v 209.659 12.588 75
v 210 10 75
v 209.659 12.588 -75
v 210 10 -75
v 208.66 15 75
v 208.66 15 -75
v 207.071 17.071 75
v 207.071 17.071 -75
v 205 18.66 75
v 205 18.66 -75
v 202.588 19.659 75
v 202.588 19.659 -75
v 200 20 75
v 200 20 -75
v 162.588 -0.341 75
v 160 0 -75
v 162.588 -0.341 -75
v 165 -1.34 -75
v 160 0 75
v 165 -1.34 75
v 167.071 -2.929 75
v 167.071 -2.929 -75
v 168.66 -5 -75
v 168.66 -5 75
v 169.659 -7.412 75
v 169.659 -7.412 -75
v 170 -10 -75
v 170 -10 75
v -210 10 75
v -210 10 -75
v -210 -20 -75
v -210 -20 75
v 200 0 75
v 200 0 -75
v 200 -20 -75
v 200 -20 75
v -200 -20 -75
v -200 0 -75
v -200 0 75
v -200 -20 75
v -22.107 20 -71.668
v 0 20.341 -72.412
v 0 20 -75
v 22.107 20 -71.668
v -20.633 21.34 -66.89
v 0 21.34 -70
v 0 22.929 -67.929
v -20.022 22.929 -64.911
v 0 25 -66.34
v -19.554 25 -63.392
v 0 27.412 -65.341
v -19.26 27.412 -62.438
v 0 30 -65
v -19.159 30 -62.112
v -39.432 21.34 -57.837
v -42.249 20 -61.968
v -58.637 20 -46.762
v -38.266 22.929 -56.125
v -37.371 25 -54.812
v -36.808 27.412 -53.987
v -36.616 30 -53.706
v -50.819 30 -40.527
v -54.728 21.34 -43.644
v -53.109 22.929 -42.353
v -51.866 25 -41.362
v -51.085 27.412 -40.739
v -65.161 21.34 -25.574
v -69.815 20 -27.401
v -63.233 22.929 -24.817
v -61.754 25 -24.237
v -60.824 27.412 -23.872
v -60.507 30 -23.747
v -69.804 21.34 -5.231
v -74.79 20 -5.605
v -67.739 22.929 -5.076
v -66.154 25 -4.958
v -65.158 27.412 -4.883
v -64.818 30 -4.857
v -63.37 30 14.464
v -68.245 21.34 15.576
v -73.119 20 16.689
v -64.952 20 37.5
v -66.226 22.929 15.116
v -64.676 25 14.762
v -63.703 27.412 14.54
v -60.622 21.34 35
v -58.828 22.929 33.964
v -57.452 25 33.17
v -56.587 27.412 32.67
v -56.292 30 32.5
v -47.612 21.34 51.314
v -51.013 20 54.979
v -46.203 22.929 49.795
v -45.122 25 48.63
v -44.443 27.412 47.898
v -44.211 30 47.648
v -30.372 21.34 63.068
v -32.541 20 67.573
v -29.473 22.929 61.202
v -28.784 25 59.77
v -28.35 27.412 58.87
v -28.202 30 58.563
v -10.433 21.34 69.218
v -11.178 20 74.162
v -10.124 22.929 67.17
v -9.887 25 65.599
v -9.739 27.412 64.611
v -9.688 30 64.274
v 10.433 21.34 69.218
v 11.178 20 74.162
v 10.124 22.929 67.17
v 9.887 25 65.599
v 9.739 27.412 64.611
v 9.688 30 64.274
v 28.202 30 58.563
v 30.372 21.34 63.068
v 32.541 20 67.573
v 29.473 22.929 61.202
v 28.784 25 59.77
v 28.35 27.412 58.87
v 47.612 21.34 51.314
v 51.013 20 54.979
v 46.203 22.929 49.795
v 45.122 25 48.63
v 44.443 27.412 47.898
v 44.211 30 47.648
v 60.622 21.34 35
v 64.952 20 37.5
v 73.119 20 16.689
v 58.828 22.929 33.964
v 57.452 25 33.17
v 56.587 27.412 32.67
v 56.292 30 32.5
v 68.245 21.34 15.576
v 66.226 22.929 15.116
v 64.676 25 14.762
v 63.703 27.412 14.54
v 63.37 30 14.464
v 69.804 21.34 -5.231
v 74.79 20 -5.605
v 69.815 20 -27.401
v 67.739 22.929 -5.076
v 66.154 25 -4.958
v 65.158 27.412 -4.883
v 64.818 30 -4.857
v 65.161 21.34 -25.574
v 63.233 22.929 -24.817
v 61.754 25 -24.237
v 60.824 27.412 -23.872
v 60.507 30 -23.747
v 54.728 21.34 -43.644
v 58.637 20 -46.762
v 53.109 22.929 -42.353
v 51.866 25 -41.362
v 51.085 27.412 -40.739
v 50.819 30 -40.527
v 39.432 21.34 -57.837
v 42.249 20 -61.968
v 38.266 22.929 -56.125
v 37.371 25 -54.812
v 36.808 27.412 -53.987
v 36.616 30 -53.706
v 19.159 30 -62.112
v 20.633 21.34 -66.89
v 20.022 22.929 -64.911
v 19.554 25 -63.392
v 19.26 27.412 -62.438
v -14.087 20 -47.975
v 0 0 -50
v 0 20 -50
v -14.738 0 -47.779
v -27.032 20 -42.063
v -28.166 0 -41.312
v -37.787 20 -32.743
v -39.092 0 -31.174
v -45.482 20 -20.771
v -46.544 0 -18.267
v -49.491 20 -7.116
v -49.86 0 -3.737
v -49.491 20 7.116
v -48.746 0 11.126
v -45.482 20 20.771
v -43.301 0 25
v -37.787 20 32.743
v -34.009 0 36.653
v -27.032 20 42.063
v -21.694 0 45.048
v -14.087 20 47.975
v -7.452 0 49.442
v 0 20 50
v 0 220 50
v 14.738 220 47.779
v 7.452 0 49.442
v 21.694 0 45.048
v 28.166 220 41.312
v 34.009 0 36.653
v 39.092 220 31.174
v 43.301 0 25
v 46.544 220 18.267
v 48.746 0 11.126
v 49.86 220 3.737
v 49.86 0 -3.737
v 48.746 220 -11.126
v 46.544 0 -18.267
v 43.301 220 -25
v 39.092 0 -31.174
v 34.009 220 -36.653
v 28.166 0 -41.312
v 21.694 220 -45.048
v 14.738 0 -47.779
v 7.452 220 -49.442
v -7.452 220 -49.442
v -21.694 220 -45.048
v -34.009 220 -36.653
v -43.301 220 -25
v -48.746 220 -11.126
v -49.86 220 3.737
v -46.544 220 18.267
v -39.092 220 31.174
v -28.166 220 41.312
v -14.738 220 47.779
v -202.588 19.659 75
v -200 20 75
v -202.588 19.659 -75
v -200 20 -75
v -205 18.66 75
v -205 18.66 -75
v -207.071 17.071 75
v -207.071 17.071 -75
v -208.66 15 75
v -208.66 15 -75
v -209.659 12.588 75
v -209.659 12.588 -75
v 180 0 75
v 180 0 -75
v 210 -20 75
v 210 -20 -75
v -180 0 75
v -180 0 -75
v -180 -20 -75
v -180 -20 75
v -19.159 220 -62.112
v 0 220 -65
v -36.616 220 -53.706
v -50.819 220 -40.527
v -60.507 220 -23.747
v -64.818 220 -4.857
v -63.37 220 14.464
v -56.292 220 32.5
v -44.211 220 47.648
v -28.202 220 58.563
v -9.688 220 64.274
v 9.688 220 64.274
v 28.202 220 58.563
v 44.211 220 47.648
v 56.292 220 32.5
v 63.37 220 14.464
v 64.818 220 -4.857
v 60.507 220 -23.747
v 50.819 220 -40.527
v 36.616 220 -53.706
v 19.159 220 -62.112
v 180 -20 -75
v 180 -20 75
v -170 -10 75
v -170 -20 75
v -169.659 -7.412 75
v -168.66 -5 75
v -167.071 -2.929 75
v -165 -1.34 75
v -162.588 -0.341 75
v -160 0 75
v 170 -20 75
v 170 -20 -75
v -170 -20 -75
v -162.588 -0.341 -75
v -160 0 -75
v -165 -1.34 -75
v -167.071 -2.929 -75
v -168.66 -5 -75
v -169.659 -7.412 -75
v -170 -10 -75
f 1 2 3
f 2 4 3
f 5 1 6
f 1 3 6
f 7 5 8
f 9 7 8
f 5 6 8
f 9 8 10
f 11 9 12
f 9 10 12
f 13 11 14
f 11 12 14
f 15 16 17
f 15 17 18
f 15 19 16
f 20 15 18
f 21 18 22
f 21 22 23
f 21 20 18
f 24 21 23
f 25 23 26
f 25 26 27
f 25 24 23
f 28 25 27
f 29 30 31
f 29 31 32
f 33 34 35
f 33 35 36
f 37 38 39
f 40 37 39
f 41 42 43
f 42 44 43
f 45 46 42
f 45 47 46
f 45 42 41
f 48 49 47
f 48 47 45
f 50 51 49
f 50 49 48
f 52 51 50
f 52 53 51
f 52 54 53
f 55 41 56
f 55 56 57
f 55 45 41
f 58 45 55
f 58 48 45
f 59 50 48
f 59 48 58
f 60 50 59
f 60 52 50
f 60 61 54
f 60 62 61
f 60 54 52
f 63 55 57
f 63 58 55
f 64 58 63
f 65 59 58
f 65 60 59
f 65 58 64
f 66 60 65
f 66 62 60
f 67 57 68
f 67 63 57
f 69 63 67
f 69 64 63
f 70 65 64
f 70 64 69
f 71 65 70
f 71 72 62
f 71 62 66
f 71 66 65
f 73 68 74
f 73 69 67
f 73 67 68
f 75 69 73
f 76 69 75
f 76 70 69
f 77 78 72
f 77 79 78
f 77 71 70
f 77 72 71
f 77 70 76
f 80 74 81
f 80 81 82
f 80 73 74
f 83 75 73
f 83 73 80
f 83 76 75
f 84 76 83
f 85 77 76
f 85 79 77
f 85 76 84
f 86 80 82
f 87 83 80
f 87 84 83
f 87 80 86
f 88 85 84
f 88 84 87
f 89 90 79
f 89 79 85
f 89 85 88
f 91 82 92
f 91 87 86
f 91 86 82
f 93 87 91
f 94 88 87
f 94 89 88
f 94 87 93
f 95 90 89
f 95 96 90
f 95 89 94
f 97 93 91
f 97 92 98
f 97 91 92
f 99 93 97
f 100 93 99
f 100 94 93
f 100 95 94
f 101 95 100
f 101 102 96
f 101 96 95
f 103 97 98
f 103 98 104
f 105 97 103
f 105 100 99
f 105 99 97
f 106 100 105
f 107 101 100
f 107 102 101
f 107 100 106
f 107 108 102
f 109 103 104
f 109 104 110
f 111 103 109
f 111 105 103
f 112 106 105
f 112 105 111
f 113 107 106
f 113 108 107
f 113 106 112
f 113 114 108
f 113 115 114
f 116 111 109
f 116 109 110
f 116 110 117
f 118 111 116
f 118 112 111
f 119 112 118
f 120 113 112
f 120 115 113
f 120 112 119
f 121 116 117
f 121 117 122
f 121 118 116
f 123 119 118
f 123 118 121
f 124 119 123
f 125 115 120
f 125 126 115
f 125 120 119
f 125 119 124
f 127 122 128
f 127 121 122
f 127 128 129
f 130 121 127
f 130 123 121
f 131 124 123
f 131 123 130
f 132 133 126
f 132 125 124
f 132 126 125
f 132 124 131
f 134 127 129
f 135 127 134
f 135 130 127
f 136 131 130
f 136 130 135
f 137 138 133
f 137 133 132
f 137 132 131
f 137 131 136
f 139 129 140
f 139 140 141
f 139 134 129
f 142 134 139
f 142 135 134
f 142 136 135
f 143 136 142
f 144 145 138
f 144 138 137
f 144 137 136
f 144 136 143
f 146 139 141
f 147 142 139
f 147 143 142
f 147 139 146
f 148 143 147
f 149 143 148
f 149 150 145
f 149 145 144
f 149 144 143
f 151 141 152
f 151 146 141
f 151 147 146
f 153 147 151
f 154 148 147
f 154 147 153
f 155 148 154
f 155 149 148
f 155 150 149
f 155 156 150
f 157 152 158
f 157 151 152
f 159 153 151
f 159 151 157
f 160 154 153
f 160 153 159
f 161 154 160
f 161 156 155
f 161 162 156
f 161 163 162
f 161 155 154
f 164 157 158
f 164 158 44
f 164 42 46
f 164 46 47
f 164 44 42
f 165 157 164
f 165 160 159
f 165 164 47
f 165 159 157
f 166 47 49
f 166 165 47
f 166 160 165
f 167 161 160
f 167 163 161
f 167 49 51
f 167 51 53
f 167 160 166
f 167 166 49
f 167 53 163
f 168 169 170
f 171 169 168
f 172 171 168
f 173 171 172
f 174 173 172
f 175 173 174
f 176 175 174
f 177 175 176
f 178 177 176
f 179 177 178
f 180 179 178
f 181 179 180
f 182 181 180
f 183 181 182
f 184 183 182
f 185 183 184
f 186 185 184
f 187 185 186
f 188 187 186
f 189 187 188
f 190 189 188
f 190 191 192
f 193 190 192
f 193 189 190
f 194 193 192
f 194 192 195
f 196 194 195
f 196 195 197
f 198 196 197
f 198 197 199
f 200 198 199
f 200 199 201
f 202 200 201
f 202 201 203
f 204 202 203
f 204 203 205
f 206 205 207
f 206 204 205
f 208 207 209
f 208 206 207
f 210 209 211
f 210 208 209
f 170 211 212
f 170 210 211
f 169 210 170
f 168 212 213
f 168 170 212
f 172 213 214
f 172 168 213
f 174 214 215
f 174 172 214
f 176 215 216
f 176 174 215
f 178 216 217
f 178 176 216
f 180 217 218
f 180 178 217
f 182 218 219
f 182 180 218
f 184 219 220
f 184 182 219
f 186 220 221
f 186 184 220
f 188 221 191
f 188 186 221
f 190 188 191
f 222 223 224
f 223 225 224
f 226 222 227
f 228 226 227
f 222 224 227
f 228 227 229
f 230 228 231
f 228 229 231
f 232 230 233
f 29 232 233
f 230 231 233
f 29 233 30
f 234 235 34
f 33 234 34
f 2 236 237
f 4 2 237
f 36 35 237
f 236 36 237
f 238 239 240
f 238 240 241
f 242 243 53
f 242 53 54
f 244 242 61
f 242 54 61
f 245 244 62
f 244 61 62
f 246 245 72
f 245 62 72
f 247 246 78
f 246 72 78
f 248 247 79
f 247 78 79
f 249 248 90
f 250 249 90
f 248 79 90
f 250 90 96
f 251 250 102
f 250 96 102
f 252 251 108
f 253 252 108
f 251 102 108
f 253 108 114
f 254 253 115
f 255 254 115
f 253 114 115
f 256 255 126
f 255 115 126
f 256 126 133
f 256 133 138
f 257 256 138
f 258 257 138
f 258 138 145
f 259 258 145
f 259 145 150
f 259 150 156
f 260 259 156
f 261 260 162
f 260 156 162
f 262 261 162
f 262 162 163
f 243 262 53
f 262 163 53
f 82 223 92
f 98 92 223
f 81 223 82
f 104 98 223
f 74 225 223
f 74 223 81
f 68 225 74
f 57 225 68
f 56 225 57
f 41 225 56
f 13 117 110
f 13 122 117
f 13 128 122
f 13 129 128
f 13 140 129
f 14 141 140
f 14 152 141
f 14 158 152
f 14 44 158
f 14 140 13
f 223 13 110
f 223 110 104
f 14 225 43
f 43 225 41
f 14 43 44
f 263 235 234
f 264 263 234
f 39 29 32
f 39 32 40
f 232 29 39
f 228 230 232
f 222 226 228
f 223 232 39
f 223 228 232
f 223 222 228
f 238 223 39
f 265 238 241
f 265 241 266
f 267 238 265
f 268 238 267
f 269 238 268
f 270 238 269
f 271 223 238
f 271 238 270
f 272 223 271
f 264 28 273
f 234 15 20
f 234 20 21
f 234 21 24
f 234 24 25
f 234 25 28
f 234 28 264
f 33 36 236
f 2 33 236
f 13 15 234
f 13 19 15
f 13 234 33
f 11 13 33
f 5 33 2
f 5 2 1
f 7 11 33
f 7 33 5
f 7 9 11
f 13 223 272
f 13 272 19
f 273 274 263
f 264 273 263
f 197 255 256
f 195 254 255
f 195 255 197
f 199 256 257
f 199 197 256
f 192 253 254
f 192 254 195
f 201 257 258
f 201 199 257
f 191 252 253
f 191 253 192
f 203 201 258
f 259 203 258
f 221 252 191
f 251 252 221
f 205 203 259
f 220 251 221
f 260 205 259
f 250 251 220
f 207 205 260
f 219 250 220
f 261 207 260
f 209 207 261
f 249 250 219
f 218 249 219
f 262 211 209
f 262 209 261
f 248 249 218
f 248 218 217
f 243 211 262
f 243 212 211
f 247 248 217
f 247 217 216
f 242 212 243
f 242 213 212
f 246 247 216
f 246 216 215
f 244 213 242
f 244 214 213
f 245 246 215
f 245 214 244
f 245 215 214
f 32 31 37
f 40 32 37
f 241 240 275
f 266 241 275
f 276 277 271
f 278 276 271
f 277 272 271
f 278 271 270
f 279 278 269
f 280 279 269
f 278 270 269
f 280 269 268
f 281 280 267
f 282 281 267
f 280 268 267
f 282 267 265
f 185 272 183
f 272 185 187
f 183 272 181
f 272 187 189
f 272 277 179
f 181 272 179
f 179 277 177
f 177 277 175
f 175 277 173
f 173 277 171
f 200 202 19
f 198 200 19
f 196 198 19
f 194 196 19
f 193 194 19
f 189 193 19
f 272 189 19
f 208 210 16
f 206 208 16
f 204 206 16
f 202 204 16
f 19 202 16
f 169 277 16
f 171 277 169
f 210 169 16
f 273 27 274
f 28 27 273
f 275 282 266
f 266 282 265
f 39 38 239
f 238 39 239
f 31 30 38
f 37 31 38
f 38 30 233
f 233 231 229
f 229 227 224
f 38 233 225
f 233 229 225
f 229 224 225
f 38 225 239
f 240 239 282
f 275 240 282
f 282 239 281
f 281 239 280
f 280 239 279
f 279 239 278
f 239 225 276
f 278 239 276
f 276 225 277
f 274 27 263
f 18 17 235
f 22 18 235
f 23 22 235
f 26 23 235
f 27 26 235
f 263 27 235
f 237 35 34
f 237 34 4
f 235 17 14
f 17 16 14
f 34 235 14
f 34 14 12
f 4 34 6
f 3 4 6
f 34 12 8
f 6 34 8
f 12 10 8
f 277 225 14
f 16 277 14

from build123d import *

# Parameters (mm, degrees)
SKETCH1_W           = 420
SKETCH1_H           = 150
BOSS_EXTRUDE1_DEPTH = 20
SKETCH2_W           = 10
SKETCH2_H           = 150
BOSS_EXTRUDE3_DEPTH = 20
FILLET1_R           = 10
FILLET2_R           = 10
FILLET3_R           = 10
FILLET4_R           = 10
SKETCH3_R           = 65
SKETCH3_R_2         = 50
BOSS_EXTRUDE4_DEPTH = 200
FILLET5_R           = 10
CUT_EXTRUDE1_START  = -327
SKETCH4_R           = 50
CUT_EXTRUDE1_DEPTH  = 327


with BuildPart() as part:
    # Sketch1 → Boss-Extrude1 (new body)
    with BuildSketch(Plane(origin=(0, 0, 0), x_dir=(1, 0, 0), z_dir=(0, 1, 0))):
        Rectangle(SKETCH1_W, SKETCH1_H)
    extrude(amount=BOSS_EXTRUDE1_DEPTH)

    # Sketch2 → Boss-Extrude3 (add)
    with BuildSketch(Plane.XZ):
        with Locations((-205, 0)):
            Rectangle(SKETCH2_W, SKETCH2_H)
        with Locations((-175, 0)):
            Rectangle(SKETCH2_W, SKETCH2_H)
        with Locations((205, 0)):
            Rectangle(SKETCH2_W, SKETCH2_H)
        with Locations((175, 0)):
            Rectangle(SKETCH2_W, SKETCH2_H)
    extrude(amount=BOSS_EXTRUDE3_DEPTH)

    # Fillet1
    fillet1_edges = [part.edges().sort_by_distance(p)[0] for p in [
        (-170, 0, 0),
    ]]
    fillet(fillet1_edges, radius=FILLET1_R)

    # Fillet2
    fillet2_edges = [part.edges().sort_by_distance(p)[0] for p in [
        (170, 0, 0),
    ]]
    fillet(fillet2_edges, radius=FILLET2_R)

    # Fillet3
    fillet3_edges = [part.edges().sort_by_distance(p)[0] for p in [
        (210, 20, 0),
    ]]
    fillet(fillet3_edges, radius=FILLET3_R)

    # Fillet4
    fillet4_edges = [part.edges().sort_by_distance(p)[0] for p in [
        (-210, 20, 0),
    ]]
    fillet(fillet4_edges, radius=FILLET4_R)

    # Sketch3 → Boss-Extrude4 (add)
    with BuildSketch(Plane(origin=(0, 20, 0), x_dir=(1, 0, 0), z_dir=(0, 1, 0))):
        with Locations(Location((0, 0, 0), (0, 0, 90))):
            Circle(SKETCH3_R)
        with Locations(Location((0, 0, 0), (0, 0, 270))):
            Circle(SKETCH3_R_2, mode=Mode.SUBTRACT)
    extrude(amount=BOSS_EXTRUDE4_DEPTH)

    # Fillet5
    fillet5_edges = [part.edges().sort_by_distance(p)[0] for p in [
        (0, 20, 65),
    ]]
    fillet(fillet5_edges, radius=FILLET5_R - 0.0001)  # a hair under: the kernel refuses the full size

    # Sketch4 → Cut-Extrude1 (cut)
    with BuildSketch(Plane(origin=(0, 220, 0), x_dir=(1, 0, 0), z_dir=(0, 1, 0)).offset(CUT_EXTRUDE1_START)):
        with Locations(Location((0, 0, 0), (0, 0, 90))):
            Circle(SKETCH4_R)
    extrude(amount=CUT_EXTRUDE1_DEPTH, mode=Mode.SUBTRACT)


solid = part.part
